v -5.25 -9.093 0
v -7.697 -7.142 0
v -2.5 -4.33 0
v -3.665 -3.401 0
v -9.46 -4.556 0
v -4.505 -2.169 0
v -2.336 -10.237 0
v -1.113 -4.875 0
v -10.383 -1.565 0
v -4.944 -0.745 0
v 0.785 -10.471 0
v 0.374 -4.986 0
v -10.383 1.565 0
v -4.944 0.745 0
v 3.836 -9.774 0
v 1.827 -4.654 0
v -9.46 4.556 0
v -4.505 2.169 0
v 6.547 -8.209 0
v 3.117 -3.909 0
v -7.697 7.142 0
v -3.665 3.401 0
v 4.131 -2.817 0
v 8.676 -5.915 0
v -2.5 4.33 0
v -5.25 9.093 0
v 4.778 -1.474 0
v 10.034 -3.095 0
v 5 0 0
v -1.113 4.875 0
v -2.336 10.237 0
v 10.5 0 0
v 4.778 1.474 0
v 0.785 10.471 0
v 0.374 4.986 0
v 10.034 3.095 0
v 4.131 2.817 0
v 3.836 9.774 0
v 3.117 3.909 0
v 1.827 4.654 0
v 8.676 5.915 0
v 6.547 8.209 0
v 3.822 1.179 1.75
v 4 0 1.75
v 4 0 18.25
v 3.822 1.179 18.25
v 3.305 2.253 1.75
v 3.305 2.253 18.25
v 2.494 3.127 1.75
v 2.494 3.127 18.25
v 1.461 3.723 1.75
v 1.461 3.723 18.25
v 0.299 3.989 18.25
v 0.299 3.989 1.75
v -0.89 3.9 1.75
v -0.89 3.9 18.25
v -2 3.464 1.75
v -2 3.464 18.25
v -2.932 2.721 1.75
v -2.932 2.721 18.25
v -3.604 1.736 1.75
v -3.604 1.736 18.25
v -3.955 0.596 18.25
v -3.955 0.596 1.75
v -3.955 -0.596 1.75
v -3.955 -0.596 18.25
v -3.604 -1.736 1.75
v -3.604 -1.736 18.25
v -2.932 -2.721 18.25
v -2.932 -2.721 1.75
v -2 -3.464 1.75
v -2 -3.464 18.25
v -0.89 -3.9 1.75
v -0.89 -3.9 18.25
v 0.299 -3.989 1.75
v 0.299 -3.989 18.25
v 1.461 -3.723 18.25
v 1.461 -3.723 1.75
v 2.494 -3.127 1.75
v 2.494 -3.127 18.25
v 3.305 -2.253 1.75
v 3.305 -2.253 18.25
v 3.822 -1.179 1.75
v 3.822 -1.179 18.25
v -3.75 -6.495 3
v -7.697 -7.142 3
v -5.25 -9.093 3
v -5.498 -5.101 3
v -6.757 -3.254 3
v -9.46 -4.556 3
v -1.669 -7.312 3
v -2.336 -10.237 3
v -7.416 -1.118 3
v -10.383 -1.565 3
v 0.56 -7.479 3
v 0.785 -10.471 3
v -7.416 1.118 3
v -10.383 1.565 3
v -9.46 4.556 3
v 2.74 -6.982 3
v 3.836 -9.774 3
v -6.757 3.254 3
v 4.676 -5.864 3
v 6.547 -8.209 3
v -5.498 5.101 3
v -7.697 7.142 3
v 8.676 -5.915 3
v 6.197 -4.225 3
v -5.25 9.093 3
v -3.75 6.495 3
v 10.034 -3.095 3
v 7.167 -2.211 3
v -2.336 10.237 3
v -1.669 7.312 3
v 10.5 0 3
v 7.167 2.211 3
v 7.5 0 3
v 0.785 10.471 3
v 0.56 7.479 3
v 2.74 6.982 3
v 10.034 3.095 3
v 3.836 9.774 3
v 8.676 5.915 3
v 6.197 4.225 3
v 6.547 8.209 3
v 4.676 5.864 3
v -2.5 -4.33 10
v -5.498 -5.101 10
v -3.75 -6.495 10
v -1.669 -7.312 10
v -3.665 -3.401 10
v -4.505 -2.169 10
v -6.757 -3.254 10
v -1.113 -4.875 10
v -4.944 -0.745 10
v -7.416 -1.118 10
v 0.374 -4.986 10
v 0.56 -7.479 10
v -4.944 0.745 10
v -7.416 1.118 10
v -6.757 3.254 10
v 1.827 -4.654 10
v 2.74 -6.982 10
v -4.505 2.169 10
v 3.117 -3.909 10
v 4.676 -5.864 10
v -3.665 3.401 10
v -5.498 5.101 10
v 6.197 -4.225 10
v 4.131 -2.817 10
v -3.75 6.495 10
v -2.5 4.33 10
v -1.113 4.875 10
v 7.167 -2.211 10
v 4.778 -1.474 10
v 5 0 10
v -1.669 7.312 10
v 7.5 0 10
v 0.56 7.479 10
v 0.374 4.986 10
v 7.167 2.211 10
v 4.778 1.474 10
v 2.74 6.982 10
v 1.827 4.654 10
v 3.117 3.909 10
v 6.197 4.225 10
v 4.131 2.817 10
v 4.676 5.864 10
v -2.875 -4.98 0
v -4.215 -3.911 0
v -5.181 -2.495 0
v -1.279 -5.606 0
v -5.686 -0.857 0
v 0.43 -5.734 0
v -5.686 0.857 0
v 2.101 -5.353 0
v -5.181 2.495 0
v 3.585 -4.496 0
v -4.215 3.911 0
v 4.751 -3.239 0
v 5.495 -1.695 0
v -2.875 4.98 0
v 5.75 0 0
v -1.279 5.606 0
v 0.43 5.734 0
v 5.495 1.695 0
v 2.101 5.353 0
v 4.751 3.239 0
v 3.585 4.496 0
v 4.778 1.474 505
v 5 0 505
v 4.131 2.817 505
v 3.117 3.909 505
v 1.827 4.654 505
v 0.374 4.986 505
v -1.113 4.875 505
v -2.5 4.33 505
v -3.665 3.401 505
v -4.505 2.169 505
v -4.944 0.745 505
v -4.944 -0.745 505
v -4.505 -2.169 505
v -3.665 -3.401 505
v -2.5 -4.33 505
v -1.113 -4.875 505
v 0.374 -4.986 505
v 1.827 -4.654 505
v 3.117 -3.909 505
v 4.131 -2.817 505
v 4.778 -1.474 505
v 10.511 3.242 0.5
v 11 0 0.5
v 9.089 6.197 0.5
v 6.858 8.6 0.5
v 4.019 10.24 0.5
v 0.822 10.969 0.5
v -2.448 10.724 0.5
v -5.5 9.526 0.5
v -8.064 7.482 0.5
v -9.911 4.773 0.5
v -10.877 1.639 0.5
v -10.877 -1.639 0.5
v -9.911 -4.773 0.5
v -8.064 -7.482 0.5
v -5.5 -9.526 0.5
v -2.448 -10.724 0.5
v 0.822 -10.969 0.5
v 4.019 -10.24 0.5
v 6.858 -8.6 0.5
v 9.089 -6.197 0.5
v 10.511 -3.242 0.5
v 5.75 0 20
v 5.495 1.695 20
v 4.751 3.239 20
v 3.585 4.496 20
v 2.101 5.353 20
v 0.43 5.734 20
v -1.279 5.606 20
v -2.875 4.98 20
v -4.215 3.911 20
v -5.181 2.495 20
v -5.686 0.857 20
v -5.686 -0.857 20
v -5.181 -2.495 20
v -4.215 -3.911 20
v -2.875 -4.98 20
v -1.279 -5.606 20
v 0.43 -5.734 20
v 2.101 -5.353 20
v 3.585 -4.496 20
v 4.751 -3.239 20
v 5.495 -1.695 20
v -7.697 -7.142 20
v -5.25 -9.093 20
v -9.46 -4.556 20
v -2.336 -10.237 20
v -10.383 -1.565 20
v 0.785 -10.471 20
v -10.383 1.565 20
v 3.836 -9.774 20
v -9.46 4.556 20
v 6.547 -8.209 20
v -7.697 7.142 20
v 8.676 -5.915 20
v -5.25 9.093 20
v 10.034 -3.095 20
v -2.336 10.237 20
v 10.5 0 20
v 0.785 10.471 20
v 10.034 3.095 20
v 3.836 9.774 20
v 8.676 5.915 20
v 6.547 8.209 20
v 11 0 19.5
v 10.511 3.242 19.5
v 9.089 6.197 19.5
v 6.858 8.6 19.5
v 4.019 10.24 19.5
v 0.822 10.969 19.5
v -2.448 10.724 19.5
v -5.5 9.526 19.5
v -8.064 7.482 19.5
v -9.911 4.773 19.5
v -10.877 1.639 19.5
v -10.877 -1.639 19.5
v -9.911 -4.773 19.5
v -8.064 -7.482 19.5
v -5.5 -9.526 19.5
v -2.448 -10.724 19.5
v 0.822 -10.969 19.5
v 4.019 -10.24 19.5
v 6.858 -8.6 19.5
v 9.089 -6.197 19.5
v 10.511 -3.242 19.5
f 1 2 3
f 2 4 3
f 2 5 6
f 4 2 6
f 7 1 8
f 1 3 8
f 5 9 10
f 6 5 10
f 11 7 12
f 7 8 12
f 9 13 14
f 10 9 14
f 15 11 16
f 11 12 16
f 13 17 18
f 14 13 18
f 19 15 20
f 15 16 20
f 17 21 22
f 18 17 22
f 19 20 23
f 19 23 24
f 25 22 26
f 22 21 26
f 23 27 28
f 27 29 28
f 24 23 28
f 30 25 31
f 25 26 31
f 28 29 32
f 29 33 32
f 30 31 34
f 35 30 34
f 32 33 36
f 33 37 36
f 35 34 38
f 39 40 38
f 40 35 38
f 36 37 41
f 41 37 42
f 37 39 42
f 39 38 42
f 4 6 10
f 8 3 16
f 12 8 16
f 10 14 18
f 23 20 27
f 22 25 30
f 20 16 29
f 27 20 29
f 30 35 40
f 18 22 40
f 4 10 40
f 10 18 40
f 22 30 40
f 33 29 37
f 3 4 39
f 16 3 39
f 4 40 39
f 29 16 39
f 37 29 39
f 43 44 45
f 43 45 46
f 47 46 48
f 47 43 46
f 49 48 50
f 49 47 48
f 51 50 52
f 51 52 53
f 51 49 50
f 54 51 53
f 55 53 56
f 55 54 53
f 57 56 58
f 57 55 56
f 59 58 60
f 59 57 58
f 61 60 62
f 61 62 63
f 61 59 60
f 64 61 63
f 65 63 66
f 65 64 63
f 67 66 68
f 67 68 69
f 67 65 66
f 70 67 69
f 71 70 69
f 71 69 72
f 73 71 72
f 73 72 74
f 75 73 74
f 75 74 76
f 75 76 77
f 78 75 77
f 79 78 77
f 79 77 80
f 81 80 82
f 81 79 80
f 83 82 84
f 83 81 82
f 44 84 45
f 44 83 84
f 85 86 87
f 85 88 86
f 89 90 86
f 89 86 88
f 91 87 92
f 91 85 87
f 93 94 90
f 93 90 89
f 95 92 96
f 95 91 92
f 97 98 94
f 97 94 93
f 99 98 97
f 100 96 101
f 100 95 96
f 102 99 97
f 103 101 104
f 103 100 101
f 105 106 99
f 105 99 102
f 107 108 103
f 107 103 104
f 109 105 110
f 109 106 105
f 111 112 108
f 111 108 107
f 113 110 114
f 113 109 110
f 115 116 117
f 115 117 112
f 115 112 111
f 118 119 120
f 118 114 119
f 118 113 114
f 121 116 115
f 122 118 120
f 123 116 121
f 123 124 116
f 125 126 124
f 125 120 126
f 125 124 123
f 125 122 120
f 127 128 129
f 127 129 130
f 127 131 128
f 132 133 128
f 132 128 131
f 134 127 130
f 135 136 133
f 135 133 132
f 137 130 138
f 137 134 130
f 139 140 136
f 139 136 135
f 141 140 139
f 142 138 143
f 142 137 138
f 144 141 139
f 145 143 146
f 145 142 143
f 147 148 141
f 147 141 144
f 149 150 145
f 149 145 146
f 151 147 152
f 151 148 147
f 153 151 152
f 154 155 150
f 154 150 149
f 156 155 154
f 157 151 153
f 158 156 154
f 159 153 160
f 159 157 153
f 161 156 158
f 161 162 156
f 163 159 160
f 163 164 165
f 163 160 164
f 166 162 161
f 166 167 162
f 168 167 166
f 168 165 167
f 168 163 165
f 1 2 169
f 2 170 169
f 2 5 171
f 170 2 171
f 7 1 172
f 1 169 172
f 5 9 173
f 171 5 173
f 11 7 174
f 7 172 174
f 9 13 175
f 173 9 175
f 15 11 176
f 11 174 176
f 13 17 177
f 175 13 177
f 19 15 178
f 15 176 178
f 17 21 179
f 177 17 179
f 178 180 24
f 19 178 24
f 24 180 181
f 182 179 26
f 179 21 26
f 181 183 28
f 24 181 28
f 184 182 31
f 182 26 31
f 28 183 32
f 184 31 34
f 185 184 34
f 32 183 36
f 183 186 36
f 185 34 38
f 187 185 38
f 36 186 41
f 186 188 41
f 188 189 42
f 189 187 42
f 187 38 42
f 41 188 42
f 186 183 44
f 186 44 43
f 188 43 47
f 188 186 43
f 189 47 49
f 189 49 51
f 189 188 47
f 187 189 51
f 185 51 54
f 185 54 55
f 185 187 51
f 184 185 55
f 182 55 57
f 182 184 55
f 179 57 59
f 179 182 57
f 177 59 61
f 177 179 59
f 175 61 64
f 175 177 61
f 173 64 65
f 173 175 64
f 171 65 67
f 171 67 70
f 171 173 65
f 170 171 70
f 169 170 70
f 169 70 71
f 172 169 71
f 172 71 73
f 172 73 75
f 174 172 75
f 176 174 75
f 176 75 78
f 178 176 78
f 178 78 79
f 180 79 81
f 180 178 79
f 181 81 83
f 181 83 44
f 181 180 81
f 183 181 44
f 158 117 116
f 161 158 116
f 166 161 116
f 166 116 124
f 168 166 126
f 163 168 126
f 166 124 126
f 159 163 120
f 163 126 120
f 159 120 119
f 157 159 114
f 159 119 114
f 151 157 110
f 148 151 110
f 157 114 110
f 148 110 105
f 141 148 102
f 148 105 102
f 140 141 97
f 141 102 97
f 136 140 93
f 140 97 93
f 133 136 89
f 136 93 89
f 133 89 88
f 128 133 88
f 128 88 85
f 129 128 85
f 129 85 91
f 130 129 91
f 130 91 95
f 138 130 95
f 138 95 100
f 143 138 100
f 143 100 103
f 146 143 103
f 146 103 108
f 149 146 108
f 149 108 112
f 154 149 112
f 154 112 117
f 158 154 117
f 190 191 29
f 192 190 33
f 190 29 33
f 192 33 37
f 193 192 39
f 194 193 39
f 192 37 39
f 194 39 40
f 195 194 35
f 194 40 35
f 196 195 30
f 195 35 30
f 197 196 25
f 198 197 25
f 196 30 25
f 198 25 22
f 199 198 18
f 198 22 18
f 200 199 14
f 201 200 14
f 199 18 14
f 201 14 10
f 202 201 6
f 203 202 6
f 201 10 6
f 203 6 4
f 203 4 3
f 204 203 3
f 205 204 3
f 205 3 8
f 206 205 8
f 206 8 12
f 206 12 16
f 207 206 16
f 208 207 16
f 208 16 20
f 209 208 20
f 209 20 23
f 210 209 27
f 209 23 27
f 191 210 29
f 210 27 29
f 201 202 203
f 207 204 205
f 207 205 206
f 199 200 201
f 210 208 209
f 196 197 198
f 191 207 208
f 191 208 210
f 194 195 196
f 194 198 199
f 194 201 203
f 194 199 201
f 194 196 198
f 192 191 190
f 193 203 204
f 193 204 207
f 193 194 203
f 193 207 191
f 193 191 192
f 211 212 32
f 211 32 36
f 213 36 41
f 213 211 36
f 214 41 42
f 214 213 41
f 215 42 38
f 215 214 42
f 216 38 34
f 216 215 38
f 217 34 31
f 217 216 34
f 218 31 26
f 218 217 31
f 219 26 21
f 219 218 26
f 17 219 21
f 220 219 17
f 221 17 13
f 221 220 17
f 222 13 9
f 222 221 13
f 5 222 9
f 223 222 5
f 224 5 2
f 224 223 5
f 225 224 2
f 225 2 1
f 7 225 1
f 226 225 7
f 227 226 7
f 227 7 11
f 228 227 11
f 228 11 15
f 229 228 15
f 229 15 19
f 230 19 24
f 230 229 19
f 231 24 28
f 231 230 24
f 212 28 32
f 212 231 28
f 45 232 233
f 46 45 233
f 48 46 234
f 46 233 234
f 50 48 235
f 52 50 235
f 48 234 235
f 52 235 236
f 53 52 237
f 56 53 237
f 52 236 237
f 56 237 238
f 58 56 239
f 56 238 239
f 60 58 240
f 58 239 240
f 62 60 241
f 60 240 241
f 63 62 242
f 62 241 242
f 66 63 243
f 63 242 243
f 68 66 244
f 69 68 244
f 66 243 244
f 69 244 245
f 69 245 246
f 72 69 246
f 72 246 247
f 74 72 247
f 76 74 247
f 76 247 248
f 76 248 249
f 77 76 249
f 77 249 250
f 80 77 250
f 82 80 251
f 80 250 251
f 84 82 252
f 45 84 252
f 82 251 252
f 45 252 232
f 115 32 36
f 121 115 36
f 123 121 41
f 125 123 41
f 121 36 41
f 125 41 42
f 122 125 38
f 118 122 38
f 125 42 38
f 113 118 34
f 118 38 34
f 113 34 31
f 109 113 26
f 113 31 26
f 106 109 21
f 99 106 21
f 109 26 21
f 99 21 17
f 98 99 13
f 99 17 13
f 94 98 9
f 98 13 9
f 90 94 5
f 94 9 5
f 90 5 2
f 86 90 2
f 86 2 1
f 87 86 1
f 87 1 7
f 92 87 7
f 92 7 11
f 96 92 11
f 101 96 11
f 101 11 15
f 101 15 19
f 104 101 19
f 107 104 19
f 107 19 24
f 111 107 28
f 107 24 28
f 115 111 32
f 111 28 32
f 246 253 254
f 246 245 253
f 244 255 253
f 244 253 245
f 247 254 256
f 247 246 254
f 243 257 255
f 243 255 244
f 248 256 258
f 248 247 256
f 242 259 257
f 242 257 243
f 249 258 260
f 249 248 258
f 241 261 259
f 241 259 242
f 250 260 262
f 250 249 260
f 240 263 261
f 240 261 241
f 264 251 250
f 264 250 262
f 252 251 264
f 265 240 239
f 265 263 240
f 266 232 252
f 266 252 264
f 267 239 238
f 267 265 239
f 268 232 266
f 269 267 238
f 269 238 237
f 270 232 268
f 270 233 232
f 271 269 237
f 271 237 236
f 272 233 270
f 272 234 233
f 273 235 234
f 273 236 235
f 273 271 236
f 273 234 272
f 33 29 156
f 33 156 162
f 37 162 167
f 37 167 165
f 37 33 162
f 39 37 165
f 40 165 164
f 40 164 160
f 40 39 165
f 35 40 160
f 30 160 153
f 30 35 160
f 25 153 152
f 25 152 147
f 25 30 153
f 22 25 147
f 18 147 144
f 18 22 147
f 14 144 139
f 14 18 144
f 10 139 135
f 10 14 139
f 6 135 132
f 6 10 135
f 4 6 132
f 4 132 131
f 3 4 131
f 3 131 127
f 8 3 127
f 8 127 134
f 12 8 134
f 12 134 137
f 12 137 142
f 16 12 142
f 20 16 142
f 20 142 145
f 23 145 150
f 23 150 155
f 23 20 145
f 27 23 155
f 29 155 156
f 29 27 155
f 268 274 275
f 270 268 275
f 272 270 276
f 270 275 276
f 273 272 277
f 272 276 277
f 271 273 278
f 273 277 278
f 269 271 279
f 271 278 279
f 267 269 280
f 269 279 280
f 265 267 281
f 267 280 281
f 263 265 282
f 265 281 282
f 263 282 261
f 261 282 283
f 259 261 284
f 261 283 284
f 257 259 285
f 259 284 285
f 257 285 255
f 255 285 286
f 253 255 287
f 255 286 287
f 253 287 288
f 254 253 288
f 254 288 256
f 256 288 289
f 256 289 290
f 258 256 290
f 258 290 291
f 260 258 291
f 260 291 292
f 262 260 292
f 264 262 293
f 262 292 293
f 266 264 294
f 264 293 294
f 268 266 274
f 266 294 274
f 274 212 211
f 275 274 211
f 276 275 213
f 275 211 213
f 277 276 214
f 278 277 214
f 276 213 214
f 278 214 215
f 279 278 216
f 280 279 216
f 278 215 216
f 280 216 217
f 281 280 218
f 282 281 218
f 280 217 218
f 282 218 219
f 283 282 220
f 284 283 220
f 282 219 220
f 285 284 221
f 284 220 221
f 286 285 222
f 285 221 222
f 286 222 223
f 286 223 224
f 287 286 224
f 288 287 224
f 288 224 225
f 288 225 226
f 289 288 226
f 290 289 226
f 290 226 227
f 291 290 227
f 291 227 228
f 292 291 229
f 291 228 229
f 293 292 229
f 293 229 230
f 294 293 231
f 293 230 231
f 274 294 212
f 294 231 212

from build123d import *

# Parameters (mm, degrees)
F0_R     = 7.5
F0_R_2   = 5
F1_DEPTH = 10
F0_R_3   = 10.5
F2_DEPTH = 3
F3_R     = 11
F3_R_2   = 4
F4_DEPTH = 20
F5_SIZE  = 1.75
F6_SIZE  = 0.5
F7_R     = 5
F8_DEPTH = 505


with BuildPart() as f1:
    # F0 (on Top) → F1 (new body)
    with BuildSketch(Plane.XY):
        Circle(F0_R)
        Circle(F0_R_2, mode=Mode.SUBTRACT)
    extrude(amount=F1_DEPTH)

    # F0 (on Top) → F2 (join)
    with BuildSketch(Plane.XY):
        Circle(F0_R_3)
        Circle(F0_R, mode=Mode.SUBTRACT)
    extrude(amount=F2_DEPTH)


with BuildPart() as f4:
    # F3 (on Top) → F4 (new body)
    with BuildSketch(Plane.XY):
        Circle(F3_R)
        Circle(F3_R_2, mode=Mode.SUBTRACT)
    extrude(amount=F4_DEPTH)

    # F5
    f5_edges = [f4.edges().sort_by_distance(p)[0] for p in [
        (-4, 0, 20),
        (-4, 0, 0),
    ]]
    chamfer(f5_edges, length=F5_SIZE)

    # F6
    f6_edges = [f4.edges().sort_by_distance(p)[0] for p in [
        (-11, 0, 20),
        (-11, 0, 0),
    ]]
    chamfer(f6_edges, length=F6_SIZE)


with BuildPart() as f8:
    # F7 (on Top) → F8 (new body)
    with BuildSketch(Plane.XY):
        Circle(F7_R)
    extrude(amount=F8_DEPTH)


solid = Compound([f1.part, f4.part, f8.part])
